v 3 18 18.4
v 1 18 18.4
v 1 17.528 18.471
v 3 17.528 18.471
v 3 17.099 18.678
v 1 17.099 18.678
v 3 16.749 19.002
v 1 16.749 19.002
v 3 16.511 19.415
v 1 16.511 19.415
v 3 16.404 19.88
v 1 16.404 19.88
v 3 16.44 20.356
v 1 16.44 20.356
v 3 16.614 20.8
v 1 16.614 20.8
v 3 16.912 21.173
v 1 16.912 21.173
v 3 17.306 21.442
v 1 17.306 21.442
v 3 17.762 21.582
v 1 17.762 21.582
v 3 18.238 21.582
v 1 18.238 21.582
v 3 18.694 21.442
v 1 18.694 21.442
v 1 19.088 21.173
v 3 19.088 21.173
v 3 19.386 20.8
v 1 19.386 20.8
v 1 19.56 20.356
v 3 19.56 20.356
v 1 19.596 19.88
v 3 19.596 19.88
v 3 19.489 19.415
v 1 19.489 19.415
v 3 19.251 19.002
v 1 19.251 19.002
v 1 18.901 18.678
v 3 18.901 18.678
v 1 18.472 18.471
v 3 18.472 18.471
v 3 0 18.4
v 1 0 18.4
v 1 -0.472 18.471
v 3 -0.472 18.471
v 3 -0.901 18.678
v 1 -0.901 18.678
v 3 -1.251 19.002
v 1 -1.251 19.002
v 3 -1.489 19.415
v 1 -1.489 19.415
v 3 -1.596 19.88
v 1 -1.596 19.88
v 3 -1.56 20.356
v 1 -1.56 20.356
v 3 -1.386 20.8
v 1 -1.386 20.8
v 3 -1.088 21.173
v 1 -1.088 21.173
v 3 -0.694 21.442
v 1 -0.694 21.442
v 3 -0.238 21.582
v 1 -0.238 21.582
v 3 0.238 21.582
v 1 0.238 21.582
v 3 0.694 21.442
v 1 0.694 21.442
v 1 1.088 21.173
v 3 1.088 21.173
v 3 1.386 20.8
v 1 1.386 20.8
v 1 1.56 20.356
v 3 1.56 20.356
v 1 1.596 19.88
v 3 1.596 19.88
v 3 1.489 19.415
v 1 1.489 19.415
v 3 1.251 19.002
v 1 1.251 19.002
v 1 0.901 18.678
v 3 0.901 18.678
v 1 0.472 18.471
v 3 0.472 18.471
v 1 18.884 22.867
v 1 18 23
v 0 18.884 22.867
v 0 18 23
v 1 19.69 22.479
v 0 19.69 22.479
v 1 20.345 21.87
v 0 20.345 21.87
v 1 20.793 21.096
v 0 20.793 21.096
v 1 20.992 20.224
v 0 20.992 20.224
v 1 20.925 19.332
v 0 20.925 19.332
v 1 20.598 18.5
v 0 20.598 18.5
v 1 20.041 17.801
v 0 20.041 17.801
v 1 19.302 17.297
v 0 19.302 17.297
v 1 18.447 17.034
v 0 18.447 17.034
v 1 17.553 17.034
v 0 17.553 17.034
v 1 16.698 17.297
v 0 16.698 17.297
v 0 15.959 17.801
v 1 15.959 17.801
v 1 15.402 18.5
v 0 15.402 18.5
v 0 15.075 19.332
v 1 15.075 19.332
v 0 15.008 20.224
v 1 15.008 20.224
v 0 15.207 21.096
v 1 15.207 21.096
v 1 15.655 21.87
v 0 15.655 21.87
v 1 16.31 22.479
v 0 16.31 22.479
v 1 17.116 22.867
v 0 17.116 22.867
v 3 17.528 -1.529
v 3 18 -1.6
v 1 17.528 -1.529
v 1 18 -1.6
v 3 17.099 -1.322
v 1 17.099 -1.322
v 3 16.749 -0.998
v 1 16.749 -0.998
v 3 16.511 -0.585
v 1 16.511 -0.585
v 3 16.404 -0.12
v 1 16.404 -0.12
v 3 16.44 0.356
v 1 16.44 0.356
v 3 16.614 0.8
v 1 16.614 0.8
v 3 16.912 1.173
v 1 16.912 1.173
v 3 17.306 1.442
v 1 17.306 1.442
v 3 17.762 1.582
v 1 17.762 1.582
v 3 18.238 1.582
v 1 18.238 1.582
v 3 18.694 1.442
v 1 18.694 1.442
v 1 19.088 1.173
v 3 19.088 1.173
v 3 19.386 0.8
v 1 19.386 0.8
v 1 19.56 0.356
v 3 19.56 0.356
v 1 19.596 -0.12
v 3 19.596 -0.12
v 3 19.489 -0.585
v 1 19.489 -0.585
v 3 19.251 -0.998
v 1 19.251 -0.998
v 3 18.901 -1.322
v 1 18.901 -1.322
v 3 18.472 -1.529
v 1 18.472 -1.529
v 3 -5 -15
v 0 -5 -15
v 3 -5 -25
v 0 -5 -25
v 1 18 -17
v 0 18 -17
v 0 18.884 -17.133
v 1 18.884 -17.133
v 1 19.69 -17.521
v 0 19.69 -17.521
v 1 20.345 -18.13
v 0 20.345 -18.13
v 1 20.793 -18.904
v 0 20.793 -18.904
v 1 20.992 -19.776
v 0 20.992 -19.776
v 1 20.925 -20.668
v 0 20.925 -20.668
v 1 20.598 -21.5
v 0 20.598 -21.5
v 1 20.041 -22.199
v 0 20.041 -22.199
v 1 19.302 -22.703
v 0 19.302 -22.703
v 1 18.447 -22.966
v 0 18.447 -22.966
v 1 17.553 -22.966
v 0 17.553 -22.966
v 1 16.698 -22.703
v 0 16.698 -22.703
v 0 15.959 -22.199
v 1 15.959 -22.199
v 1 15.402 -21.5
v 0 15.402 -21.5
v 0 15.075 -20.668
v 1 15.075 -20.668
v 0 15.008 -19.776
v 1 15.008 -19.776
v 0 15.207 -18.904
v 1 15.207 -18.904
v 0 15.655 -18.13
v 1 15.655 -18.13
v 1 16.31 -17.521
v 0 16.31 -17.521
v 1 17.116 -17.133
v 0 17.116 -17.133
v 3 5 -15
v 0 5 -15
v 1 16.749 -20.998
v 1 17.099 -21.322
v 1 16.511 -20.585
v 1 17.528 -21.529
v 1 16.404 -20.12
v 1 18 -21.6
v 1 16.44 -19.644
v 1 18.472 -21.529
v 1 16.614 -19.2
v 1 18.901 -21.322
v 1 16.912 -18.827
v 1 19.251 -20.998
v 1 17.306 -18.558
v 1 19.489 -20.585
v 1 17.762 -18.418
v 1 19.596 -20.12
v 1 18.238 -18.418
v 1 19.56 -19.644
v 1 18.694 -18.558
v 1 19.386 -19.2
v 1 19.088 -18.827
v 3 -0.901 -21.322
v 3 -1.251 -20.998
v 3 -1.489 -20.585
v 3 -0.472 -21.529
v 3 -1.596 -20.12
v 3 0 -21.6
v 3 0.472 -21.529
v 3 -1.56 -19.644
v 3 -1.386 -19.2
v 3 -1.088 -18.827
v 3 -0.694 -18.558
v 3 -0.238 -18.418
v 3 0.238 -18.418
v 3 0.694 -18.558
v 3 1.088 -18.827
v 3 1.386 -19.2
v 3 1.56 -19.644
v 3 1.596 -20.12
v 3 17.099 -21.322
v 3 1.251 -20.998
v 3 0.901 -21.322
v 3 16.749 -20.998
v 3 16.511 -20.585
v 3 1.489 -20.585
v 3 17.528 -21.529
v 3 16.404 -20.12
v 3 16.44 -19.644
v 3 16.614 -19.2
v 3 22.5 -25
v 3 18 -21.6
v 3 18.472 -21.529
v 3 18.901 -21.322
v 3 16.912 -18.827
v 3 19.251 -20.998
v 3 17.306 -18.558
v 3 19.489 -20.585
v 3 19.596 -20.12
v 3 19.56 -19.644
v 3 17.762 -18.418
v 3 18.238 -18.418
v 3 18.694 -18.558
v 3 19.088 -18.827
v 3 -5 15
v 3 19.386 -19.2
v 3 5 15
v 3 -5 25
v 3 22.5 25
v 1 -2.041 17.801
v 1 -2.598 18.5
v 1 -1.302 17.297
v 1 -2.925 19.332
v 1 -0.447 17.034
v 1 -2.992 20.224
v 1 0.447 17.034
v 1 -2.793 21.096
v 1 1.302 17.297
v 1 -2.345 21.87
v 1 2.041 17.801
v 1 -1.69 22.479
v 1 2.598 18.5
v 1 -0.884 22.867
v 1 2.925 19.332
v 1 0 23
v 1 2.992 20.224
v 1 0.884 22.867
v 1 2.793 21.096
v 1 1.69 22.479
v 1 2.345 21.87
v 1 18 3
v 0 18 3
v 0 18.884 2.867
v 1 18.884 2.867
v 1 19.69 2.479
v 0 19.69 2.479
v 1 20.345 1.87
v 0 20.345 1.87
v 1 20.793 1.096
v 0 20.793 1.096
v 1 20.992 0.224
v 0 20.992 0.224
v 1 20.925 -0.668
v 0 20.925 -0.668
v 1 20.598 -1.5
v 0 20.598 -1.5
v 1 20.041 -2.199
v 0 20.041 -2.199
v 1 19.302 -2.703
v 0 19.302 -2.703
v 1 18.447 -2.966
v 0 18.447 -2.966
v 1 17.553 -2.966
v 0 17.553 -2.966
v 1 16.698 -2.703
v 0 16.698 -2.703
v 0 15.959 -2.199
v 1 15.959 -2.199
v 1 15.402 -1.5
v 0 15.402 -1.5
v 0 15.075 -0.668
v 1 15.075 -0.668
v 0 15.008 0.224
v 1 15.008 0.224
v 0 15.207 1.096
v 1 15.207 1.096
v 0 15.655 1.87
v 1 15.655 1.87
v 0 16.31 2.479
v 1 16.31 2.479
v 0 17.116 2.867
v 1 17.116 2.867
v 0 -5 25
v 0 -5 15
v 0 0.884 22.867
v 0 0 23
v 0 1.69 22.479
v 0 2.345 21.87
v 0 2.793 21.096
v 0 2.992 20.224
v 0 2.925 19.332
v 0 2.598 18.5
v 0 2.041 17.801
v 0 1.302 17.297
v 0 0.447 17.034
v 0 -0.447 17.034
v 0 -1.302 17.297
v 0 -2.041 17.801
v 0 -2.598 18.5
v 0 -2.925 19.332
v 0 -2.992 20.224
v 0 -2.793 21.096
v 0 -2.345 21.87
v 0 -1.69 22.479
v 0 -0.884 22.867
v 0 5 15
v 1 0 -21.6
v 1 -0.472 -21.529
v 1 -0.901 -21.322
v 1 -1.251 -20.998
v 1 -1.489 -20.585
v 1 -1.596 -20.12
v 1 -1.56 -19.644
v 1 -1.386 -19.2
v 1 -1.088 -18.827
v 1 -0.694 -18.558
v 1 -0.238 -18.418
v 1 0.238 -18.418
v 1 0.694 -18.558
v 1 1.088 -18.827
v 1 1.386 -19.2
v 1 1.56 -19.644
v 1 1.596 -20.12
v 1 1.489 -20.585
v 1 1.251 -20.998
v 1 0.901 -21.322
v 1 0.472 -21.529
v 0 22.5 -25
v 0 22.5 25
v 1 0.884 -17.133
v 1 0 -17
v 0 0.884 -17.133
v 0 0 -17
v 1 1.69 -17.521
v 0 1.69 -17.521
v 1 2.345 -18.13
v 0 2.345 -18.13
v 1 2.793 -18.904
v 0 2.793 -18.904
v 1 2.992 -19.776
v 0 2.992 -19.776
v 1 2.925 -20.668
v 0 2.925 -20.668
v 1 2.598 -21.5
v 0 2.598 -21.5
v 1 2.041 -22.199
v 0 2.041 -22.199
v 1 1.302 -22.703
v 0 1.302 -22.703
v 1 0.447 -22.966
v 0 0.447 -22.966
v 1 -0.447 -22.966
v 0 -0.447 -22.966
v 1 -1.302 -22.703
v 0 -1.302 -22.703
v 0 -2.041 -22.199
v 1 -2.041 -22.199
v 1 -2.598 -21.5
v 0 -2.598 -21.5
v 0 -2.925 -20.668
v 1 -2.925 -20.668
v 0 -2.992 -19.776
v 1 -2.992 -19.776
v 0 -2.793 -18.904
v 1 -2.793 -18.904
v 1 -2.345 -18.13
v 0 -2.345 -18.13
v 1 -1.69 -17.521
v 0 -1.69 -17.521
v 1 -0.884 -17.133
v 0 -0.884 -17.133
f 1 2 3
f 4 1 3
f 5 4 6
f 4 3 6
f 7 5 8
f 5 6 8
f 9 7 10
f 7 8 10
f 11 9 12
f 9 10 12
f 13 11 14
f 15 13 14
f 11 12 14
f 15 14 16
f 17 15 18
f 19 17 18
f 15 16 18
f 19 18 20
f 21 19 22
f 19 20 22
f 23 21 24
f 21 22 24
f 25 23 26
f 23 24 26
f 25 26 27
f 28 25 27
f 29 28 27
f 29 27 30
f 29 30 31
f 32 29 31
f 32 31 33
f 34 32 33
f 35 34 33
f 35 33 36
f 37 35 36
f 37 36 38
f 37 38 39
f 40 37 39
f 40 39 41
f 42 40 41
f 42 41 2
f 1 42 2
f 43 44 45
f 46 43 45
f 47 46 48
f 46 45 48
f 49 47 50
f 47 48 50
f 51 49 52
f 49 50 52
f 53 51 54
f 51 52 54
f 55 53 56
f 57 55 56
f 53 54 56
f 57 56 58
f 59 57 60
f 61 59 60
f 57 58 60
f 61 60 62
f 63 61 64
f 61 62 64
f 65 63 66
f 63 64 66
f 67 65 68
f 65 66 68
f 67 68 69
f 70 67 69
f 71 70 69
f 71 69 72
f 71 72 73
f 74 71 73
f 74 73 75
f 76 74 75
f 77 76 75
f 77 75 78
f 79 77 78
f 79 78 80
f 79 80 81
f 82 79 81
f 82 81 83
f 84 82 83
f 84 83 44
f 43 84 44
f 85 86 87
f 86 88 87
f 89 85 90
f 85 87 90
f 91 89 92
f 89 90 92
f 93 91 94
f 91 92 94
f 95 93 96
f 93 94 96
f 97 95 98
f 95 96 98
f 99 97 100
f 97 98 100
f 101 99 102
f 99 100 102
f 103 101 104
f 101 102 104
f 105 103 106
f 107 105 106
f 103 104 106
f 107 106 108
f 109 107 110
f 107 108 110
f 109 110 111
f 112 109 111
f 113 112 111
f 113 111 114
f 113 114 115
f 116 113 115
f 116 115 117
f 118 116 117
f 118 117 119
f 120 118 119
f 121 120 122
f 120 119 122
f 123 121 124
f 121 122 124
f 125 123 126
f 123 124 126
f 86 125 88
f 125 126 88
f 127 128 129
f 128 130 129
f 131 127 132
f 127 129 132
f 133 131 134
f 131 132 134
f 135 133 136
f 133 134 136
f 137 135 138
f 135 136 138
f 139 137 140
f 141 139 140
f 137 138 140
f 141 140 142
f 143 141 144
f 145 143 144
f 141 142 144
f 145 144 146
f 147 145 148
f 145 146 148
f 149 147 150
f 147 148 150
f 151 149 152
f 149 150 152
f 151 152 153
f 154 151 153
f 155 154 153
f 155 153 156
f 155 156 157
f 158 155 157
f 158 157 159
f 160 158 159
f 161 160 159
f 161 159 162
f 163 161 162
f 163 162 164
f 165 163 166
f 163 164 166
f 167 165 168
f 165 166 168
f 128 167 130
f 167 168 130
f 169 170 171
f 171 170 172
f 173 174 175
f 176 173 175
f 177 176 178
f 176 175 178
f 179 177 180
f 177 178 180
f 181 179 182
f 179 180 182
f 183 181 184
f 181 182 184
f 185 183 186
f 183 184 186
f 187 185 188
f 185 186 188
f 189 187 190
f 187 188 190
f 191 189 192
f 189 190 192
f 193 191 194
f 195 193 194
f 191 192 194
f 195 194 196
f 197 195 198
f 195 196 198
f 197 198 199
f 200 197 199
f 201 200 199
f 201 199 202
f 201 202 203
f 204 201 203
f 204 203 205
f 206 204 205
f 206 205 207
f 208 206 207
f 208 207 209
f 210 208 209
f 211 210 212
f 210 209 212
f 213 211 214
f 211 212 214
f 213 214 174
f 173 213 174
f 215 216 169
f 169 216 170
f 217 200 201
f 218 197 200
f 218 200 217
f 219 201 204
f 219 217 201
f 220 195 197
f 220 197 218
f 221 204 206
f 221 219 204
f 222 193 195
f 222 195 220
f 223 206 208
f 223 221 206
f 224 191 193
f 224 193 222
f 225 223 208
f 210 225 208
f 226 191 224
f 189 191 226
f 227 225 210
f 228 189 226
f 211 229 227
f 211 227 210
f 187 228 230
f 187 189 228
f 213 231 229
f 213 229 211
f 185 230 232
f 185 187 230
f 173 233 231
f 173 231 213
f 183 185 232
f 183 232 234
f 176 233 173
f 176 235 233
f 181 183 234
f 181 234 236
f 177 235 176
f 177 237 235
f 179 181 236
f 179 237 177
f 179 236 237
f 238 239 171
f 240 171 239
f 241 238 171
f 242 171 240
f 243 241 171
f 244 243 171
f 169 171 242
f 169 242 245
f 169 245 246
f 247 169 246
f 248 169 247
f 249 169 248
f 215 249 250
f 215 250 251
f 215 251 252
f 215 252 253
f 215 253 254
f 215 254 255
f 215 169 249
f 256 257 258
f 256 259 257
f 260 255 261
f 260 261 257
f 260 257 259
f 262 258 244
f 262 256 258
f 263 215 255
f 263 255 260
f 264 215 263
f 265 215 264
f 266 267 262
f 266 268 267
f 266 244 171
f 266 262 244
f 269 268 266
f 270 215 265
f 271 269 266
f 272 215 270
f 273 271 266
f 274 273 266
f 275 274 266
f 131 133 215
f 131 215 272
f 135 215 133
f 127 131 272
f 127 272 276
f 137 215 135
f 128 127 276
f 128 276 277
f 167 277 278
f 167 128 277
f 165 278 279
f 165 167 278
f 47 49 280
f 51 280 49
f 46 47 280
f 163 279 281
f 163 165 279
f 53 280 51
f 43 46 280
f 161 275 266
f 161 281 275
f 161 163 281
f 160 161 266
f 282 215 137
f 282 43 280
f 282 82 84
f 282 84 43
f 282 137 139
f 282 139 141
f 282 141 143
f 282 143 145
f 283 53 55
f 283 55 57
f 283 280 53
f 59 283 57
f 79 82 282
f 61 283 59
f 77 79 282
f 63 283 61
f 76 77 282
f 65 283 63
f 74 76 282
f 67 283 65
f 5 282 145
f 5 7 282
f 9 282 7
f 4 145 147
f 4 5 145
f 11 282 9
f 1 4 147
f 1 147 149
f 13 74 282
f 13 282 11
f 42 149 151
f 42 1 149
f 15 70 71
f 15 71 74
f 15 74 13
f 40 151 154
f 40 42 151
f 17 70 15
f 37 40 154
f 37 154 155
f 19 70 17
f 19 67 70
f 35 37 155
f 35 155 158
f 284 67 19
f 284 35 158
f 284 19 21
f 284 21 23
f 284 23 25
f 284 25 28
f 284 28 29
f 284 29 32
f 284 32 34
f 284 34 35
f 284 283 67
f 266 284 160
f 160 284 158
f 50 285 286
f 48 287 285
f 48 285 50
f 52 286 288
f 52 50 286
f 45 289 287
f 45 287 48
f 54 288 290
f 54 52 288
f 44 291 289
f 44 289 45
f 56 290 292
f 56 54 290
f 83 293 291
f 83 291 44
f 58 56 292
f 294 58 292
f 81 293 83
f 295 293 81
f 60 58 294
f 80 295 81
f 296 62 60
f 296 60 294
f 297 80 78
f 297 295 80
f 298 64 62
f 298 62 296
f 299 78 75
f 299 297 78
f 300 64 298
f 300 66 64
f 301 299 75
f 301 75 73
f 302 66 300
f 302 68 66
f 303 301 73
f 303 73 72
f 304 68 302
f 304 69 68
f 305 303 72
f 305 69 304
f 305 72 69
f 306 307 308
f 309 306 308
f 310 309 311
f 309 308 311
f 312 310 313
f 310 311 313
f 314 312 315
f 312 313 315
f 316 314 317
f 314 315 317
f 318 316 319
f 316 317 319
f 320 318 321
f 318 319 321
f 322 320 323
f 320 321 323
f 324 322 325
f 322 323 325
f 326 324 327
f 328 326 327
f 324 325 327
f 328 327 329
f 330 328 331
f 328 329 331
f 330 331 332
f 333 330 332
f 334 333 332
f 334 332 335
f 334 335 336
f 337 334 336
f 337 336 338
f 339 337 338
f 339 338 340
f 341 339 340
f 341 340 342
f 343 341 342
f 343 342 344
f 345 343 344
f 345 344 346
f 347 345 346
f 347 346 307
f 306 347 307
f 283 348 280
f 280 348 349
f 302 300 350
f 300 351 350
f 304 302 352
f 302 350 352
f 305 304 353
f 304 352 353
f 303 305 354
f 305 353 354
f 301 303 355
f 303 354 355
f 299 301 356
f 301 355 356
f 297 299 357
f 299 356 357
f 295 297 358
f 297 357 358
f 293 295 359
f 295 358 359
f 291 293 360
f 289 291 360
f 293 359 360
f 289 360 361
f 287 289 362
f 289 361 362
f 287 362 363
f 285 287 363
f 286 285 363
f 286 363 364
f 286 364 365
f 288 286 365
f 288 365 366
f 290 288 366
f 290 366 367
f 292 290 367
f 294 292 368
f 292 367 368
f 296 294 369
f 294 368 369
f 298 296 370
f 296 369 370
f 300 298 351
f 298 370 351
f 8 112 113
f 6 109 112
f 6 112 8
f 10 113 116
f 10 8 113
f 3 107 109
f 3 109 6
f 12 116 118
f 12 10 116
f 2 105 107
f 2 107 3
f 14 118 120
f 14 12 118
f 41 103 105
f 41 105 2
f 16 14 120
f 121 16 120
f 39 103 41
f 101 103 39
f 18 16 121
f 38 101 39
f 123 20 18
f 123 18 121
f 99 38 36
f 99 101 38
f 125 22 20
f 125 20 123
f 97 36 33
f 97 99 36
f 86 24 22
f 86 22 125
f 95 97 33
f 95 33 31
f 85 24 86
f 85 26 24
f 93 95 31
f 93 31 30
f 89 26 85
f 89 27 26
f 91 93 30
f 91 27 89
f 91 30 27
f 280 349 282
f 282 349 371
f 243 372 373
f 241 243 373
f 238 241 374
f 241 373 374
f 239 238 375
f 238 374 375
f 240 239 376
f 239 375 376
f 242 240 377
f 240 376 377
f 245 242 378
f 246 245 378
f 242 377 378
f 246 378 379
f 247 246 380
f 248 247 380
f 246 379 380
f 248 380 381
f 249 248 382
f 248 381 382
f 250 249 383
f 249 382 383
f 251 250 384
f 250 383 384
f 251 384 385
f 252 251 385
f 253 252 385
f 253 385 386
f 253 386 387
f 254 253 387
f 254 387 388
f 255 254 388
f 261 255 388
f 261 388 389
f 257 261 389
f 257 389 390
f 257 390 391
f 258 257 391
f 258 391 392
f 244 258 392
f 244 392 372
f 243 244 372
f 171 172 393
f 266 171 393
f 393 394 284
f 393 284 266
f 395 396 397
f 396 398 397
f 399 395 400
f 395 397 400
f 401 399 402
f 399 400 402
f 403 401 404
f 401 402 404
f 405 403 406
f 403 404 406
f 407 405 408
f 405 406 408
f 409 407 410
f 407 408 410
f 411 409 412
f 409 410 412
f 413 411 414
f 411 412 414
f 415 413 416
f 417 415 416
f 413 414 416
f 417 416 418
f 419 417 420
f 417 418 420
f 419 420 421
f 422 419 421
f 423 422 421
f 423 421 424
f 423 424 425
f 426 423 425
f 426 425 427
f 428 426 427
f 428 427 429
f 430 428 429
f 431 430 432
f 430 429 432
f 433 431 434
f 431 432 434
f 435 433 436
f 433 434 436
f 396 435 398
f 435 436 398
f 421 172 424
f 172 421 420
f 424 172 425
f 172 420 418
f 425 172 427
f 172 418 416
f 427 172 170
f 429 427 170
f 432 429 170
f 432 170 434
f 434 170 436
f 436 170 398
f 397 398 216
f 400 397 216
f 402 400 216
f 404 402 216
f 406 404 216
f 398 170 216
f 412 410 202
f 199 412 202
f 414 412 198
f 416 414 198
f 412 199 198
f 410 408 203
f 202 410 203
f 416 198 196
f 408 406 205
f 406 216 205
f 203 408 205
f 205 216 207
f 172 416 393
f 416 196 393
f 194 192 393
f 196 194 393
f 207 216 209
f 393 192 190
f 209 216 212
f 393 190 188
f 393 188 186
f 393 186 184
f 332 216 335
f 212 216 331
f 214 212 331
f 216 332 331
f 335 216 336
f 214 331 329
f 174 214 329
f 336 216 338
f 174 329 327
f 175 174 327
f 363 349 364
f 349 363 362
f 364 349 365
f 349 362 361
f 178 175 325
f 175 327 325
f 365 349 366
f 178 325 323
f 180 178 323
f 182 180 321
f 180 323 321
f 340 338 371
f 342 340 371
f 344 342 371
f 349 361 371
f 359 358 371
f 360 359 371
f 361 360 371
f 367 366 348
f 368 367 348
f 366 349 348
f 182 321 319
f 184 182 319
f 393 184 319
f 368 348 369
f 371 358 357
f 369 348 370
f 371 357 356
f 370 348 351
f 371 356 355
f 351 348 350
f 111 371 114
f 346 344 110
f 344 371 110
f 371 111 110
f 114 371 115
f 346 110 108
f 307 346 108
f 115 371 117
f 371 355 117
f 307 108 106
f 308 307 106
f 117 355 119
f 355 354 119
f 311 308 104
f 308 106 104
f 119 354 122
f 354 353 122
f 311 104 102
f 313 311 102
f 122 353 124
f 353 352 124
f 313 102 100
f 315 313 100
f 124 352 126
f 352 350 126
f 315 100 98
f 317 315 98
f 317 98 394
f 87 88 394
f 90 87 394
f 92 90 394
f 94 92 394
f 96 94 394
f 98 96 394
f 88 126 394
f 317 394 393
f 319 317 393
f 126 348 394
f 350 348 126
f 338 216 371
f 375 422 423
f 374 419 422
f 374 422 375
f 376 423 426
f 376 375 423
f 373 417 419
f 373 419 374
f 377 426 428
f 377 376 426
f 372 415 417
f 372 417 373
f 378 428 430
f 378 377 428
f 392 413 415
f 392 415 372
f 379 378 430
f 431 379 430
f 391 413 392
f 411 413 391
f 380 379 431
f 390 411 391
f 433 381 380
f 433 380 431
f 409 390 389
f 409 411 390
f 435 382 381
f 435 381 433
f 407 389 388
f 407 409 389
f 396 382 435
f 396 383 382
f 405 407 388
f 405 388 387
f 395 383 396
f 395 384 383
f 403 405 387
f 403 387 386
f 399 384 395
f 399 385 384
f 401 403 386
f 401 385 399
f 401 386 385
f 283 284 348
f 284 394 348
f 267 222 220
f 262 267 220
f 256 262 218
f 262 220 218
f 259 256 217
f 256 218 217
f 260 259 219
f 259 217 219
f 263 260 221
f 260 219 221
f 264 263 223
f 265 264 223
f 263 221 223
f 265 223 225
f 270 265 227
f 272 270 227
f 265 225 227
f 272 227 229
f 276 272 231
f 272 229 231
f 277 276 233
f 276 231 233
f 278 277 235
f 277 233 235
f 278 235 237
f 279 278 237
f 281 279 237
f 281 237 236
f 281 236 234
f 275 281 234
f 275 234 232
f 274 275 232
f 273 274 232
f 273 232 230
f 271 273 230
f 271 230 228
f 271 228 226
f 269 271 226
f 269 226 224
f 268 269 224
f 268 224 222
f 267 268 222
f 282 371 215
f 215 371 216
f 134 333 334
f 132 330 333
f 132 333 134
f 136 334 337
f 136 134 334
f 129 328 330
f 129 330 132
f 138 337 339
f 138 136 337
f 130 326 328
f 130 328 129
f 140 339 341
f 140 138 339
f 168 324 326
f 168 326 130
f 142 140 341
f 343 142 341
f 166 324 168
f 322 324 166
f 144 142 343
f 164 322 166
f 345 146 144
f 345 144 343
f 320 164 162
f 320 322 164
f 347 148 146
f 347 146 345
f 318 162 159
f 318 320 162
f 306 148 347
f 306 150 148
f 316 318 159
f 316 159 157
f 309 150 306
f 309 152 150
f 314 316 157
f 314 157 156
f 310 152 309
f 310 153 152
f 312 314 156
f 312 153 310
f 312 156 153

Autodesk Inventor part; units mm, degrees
ref_plane "YZ Plane" through (0, 0, 0) normal (1, 0, 0) x (0, 1, 0)
ref_plane "XZ Plane" through (0, 0, 0) normal (0, 1, 0) x (-1, 0, 0)
ref_plane "XY Plane" through (0, 0, 0) normal (0, 0, 1) x (1, 0, 0)
sketch "スケッチ1" plane through (0, 0, 0) normal (1, 0, 0) x (0, 1, 0)
  line L0 (-5, -25) -> (5, -25)
  line L1 (5, -25) -> (5, 25)
  line L2 (5, 25) -> (-5, 25)
  line L3 (-5, 25) -> (-5, -25)
  line L4 (-5, -25) -> (5, 25) construction
  line L5 (5, -25) -> (-5, 25) construction
  line L6 (5, 25) -> (22.5, 25)
  line L7 (22.5, 25) -> (22.5, -25)
  line L8 (22.5, -25) -> (5, -25)
  line L9 (5, -25) -> (5, 25)
  point P0 (0, 0)
  dimension "d0" = 10
  dimension "d1" = 50
  dimension "d2" = 17.5
extrude "押し出し1" add sketch "スケッチ1" along normal blind 3
sketch "スケッチ2" plane through (3, 0, 0) normal (1, 0, 0) x (0, 0, -1)
  line L0 (25, -5) -> (25, 22.5) projected
  line L1 (25, 22.5) -> (-25, 22.5) projected
  point P0 (0, 0)
  point P1 (-20, 0)
  point P2 (20, 0)
  point P3 (-20, 18)
  point P4 (0, 18)
  point P5 (20, 18)
  dimension "d5" = 40
  dimension "d6" = 5
  dimension "d7" = 4.5
  dimension "d28" = 4.5
  dimension "d29" = 4.5
hole "穴1" at (3, 0, 20) at (3, 0, -20) at (3, 18, 20) at (3, 18, 0) at (3, 18, -20) direction (-1, 0, 0) diameter 3.2 end through all
sketch "スケッチ3" plane through (0, 0, 0) normal (-1, 0, 0) x (0, 0, 1)
  circle A0 centre (-20, 0) radius 1.6 projected
  circle A1 centre (-20, 0) radius 3
  circle A2 centre (20, 0) radius 1.6 projected
  circle A3 centre (20, 0) radius 3
  point P0 (0, 0)
  dimension "d15" = 6
  dimension "d16" = 6
extrude "押し出し2" cut sketch "スケッチ3" against normal blind 1 contours A0 | A1 | A2 | A3
sketch "スケッチ4" plane through (0, 0, 0) normal (-1, 0, 0) x (0, 0, 1)
  circle A0 centre (-20, 18) radius 1.6 projected
  circle A1 centre (-20, 18) radius 3
  circle A2 centre (0, 18) radius 1.6 projected
  circle A3 centre (0, 18) radius 3
  circle A4 centre (20, 18) radius 1.6 projected
  circle A5 centre (20, 18) radius 3
  point P0 (0, 0)
  dimension "d19" = 6
  dimension "d20" = 6
  dimension "d21" = 6
extrude "押し出し3" cut sketch "スケッチ4" against normal blind 1 contours A0 | A1 | A3 | A4 | A5
sketch "スケッチ5" plane through (0, 0, 0) normal (-1, 0, 0) x (0, 0, 1)
  line L0 (15, 5) -> (-15, 5)
  line L1 (-15, 5) -> (-15, -5)
  line L2 (-15, -5) -> (15, -5)
  line L3 (15, -5) -> (15, 5)
  line L4 (15, 5) -> (-15, -5) construction
  line L5 (-15, 5) -> (15, -5) construction
  point P0 (0, 0)
  dimension "d24" = 30
  dimension "d25" = 10
extrude "押し出し4" cut sketch "スケッチ5" against normal blind 3
properties part number "stopper"
